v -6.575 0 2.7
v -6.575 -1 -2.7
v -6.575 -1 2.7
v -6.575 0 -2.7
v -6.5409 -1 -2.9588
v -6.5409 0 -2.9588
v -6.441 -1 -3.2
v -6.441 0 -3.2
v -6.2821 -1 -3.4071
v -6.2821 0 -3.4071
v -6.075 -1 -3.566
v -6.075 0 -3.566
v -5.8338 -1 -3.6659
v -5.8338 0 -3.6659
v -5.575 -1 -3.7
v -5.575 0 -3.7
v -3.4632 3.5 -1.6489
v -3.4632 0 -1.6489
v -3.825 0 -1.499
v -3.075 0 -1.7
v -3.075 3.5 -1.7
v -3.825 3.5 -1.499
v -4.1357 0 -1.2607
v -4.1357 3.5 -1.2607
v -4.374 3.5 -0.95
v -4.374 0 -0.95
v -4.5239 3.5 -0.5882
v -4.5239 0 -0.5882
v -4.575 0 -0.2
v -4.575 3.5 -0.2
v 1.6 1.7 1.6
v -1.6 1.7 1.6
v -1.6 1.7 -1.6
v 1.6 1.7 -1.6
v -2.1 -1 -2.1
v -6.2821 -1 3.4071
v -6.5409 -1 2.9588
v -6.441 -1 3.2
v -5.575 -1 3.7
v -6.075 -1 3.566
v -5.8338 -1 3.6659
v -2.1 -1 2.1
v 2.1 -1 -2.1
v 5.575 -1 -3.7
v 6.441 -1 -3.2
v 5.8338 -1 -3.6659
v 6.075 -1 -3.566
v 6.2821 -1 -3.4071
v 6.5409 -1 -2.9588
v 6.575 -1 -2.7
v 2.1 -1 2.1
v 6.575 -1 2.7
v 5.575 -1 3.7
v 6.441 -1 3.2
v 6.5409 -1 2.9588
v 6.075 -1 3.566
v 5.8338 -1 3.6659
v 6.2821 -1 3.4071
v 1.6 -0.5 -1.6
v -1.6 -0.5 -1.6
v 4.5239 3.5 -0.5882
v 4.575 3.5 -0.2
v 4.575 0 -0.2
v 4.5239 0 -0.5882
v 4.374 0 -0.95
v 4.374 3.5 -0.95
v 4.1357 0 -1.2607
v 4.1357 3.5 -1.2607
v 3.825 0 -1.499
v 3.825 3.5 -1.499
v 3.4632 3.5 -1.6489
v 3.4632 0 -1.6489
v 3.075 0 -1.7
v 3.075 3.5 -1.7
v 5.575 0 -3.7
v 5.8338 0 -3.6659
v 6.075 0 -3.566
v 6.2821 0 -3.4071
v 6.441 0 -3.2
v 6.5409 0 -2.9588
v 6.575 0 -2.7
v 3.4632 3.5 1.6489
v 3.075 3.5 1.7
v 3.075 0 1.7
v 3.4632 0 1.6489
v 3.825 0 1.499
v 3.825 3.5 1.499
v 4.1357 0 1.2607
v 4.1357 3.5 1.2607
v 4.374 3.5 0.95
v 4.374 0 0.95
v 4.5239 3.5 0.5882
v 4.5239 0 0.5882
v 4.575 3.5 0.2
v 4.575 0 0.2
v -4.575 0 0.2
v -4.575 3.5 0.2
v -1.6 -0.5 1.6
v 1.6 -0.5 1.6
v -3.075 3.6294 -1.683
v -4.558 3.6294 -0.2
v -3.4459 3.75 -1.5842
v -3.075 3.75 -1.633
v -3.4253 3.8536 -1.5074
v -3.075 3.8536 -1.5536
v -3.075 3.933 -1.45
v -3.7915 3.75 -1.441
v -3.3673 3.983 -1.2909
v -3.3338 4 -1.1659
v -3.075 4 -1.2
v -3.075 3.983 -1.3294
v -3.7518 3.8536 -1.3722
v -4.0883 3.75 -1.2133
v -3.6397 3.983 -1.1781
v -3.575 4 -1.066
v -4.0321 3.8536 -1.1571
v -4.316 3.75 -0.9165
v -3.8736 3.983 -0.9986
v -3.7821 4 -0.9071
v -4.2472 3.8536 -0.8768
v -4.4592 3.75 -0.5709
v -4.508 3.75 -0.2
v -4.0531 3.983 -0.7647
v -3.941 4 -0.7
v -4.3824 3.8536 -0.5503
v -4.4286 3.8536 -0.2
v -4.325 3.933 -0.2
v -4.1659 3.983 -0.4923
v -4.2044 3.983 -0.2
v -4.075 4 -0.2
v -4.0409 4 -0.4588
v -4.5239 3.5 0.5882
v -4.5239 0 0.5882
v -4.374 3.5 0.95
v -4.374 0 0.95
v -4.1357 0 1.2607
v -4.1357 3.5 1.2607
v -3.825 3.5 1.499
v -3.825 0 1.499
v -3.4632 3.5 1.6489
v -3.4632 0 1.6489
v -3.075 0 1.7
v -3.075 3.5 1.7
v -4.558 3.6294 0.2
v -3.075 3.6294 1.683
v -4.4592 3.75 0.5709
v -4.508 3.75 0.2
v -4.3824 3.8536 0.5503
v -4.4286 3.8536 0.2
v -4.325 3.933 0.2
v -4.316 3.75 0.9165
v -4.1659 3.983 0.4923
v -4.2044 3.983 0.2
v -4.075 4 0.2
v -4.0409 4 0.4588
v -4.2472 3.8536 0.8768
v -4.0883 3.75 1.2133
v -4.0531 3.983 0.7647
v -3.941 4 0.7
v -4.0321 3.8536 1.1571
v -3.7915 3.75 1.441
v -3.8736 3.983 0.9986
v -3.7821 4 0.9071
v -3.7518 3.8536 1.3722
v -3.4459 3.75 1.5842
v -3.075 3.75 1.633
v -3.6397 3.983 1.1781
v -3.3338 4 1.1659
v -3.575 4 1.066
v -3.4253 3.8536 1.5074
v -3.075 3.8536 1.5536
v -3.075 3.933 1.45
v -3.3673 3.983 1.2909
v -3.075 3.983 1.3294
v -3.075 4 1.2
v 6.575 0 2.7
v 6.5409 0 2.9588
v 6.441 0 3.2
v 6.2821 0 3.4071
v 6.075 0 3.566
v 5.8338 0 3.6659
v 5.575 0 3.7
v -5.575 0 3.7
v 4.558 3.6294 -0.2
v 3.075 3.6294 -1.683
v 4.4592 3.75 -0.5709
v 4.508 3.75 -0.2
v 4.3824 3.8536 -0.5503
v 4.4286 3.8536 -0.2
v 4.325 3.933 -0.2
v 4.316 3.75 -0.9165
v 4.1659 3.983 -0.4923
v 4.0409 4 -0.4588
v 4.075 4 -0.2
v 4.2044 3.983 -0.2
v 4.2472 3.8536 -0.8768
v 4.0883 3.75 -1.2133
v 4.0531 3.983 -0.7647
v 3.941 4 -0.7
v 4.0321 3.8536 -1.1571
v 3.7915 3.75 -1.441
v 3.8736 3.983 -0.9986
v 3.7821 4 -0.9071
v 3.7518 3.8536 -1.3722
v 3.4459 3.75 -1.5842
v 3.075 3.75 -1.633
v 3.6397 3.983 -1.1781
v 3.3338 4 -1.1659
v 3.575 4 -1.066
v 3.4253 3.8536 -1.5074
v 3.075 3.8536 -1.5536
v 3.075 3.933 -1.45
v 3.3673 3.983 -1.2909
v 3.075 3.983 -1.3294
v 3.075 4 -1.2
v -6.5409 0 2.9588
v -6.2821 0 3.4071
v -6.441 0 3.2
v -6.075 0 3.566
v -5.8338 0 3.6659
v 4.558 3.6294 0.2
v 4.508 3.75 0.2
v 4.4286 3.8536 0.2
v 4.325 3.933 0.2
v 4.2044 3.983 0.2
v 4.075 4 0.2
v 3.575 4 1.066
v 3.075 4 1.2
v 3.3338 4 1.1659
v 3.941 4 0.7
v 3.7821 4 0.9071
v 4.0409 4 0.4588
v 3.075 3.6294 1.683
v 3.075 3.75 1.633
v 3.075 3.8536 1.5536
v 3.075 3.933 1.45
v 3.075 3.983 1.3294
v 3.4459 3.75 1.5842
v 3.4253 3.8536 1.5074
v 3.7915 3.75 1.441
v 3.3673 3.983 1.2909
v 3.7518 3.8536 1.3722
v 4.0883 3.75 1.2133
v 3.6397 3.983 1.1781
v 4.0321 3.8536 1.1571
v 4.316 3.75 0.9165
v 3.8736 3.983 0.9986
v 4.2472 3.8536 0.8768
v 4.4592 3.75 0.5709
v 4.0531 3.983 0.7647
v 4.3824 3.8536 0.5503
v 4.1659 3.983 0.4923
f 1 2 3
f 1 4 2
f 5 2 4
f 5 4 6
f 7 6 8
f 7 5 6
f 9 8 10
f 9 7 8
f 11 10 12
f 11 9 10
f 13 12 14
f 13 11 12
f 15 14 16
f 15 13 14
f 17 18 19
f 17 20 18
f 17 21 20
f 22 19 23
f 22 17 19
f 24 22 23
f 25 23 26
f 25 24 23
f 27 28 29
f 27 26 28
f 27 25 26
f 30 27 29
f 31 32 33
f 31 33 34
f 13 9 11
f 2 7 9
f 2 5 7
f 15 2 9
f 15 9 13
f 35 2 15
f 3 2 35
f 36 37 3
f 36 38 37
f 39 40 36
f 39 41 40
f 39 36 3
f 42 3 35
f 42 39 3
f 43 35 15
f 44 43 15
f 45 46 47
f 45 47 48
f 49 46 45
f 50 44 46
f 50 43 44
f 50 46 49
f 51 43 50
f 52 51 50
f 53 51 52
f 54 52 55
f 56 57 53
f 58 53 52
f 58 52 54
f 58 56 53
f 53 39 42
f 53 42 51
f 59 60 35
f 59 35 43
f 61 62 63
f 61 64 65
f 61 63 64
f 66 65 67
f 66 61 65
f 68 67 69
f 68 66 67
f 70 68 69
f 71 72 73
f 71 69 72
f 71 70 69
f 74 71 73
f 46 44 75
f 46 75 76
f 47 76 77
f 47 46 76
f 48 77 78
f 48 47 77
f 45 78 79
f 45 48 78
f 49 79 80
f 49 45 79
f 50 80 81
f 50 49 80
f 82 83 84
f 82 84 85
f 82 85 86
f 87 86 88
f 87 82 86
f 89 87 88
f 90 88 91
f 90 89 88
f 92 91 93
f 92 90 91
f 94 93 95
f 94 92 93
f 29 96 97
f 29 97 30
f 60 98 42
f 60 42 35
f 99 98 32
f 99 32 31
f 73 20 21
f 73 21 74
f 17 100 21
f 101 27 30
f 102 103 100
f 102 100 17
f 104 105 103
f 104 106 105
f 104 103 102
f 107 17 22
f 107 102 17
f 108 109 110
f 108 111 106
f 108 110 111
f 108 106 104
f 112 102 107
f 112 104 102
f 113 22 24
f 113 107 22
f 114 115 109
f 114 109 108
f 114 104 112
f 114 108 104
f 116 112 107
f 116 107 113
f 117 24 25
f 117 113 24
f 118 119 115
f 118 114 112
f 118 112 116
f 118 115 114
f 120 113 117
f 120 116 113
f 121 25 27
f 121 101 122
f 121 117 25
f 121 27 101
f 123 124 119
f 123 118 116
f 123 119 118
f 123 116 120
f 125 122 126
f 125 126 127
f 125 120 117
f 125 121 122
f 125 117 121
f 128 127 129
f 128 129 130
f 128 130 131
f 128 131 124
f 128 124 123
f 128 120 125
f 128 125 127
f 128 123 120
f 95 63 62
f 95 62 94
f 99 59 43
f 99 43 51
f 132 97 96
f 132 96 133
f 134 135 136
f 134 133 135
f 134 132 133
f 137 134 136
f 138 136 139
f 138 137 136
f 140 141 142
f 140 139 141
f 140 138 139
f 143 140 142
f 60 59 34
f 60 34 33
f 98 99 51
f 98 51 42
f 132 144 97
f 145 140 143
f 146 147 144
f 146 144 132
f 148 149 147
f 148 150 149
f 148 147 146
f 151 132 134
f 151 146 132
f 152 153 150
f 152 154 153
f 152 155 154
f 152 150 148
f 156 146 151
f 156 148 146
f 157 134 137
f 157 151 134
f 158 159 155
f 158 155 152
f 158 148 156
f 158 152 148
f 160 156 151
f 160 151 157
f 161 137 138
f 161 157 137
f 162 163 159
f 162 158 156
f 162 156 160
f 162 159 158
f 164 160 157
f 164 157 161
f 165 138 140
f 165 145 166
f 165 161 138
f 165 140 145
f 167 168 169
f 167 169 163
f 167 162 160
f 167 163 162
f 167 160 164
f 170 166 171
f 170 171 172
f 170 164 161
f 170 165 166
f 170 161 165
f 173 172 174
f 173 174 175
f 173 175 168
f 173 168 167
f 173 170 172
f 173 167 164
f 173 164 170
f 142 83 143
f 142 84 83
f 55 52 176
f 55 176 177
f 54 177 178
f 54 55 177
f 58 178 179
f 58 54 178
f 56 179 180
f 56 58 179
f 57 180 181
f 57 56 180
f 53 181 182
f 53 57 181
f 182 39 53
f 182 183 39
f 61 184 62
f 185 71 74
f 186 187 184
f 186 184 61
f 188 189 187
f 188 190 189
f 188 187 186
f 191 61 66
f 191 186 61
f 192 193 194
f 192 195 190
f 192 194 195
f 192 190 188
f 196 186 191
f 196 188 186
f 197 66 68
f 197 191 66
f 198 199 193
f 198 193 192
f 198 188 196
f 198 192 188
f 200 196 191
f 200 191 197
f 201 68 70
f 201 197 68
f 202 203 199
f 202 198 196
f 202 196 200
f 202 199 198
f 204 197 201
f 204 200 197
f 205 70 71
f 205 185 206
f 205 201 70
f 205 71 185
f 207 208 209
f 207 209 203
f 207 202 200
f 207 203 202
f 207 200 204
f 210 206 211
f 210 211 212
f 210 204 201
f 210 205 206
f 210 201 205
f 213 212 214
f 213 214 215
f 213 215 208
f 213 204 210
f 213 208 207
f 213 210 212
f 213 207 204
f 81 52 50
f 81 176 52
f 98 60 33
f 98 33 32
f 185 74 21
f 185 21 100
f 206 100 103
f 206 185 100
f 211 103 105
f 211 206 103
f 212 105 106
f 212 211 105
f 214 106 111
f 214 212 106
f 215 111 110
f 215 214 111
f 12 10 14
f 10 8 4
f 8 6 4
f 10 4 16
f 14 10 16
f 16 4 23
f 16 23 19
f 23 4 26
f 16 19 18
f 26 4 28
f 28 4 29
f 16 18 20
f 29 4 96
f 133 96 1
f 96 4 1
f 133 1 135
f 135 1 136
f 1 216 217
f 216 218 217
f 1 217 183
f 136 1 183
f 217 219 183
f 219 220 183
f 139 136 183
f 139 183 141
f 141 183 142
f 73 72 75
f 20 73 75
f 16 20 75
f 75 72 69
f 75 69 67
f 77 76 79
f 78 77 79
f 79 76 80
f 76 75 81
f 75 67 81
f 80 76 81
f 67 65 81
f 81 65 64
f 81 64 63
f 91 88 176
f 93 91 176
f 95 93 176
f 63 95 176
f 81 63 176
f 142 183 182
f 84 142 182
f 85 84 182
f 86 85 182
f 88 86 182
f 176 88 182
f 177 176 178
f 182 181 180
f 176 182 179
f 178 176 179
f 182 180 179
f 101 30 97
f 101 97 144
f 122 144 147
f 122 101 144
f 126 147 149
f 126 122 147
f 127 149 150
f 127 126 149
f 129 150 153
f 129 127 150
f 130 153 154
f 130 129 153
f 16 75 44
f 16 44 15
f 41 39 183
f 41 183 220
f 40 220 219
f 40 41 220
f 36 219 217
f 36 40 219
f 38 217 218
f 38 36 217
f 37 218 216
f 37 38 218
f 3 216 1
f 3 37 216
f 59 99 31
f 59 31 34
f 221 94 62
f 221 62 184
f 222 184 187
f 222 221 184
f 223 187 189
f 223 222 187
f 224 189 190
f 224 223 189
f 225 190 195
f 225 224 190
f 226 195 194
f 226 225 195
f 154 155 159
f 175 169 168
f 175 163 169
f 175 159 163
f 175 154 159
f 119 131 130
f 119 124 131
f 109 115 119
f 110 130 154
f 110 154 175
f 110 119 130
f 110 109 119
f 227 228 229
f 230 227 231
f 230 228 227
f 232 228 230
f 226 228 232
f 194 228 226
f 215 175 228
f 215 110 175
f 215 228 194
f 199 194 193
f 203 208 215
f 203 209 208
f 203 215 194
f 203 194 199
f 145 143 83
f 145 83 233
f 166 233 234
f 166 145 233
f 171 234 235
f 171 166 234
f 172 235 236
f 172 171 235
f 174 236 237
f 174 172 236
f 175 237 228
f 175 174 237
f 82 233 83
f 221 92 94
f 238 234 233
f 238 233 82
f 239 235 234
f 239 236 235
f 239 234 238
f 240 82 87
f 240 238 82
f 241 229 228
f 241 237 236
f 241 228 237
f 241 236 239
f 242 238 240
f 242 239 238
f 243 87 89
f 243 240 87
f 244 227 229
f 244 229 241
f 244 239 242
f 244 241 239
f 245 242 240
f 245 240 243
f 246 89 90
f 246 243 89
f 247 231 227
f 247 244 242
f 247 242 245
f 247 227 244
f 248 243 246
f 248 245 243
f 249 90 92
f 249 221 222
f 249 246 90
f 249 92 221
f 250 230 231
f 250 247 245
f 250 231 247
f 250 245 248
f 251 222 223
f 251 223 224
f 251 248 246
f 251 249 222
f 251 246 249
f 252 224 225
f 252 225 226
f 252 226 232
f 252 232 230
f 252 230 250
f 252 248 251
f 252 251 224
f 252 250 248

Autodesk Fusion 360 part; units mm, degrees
sketch "Sketch1" plane through (0, 0, 0) normal (0, 1, 0) x (1, 0, 0)
  line L0 (4.575, -1.7) -> (-4.575, -1.7)
  line L1 (-4.575, -1.7) -> (-4.575, 1.7)
  line L2 (-4.575, 1.7) -> (4.575, 1.7)
  line L3 (4.575, 1.7) -> (4.575, -1.7)
  line L4 (4.575, -1.7) -> (-4.575, 1.7) construction
  line L5 (-4.575, -1.7) -> (4.575, 1.7) construction
  dimension "d1" = 9.15
  dimension "d2" = 3.4
extrude "Extrude1" add sketch "Sketch1" along normal blind 4
sketch "Sketch2" plane through (0, 0, 0) normal (0, -1, 0) x (1, 0, 0)
  line L0 (-4.575, -1.7) -> (4.575, -1.7)
  line L1 (4.575, -1.7) -> (4.575, 1.7)
  line L2 (4.575, 1.7) -> (-4.575, 1.7)
  line L3 (-4.575, 1.7) -> (-4.575, -1.7)
  line L4 (6.575, -3.7) -> (-6.575, -3.7)
  line L5 (-6.575, -3.7) -> (-6.575, 3.7)
  line L6 (-6.575, 3.7) -> (6.575, 3.7)
  line L7 (6.575, 3.7) -> (6.575, -3.7)
  line L8 (6.575, -3.7) -> (-6.575, 3.7) construction
  line L9 (-6.575, -3.7) -> (6.575, 3.7) construction
  dimension "d5" = 13.15
  dimension "d6" = 7.4
extrude "Extrude2" add sketch "Sketch2" along normal blind 1 contours L0 L1 L2 L3 | L4 L5 L6 L7
fillet "Fillet1" radius 1.5 4 edges at (4.575, 2, 1.7) (4.575, 2, -1.7) (-4.575, 2, 1.7) (-4.575, 2, -1.7)
fillet "Fillet2" radius 0.5 8 edges at (4.1357, 4, -1.2607) (0, 4, -1.7) (-4.1357, 4, -1.2607) (-4.575, 4, 0) (-4.1357, 4, 1.2607) (0, 4, 1.7) (4.1357, 4, 1.2607) (4.575, 4, 0)
fillet "Fillet3" radius 1 4 edges at (6.575, -0.5, 3.7) (6.575, -0.5, -3.7) (-6.575, -0.5, 3.7) (-6.575, -0.5, -3.7)
sketch "Sketch3" plane through (0, -1, 0) normal (0, -1, 0) x (1, 0, 0)
  arc A0 (-6.575, -2.7) -> (-5.575, -3.7) centre (-5.575, -2.7) ccw
  line L0 (-5.575, -3.7) -> (5.575, -3.7)
  arc A1 (5.575, -3.7) -> (6.575, -2.7) centre (5.575, -2.7) ccw
  line L1 (6.575, -2.7) -> (6.575, 2.7)
  arc A2 (6.575, 2.7) -> (5.575, 3.7) centre (5.575, 2.7) ccw
  line L2 (5.575, 3.7) -> (-5.575, 3.7)
  arc A3 (-5.575, 3.7) -> (-6.575, 2.7) centre (-5.575, 2.7) ccw
  line L3 (-6.575, 2.7) -> (-6.575, -2.7)
  line L4 (1.6, -1.6) -> (-1.6, -1.6)
  line L5 (-1.6, -1.6) -> (-1.6, 1.6)
  line L6 (-1.6, 1.6) -> (1.6, 1.6)
  line L7 (1.6, 1.6) -> (1.6, -1.6)
  line L8 (1.6, -1.6) -> (-1.6, 1.6) construction
  line L9 (-1.6, -1.6) -> (1.6, 1.6) construction
  dimension "d12" = 3.2
  dimension "d13" = 3.2
extrude "Extrude3" cut sketch "Sketch3" against normal blind 2.7 contours L4 L5 L6 L7
chamfer "Chamfer1" distance 0.5 angle 45 4 edges at (1.6, -1, 0) (0, -1, -1.6) (0, -1, 1.6) (-1.6, -1, 0)
